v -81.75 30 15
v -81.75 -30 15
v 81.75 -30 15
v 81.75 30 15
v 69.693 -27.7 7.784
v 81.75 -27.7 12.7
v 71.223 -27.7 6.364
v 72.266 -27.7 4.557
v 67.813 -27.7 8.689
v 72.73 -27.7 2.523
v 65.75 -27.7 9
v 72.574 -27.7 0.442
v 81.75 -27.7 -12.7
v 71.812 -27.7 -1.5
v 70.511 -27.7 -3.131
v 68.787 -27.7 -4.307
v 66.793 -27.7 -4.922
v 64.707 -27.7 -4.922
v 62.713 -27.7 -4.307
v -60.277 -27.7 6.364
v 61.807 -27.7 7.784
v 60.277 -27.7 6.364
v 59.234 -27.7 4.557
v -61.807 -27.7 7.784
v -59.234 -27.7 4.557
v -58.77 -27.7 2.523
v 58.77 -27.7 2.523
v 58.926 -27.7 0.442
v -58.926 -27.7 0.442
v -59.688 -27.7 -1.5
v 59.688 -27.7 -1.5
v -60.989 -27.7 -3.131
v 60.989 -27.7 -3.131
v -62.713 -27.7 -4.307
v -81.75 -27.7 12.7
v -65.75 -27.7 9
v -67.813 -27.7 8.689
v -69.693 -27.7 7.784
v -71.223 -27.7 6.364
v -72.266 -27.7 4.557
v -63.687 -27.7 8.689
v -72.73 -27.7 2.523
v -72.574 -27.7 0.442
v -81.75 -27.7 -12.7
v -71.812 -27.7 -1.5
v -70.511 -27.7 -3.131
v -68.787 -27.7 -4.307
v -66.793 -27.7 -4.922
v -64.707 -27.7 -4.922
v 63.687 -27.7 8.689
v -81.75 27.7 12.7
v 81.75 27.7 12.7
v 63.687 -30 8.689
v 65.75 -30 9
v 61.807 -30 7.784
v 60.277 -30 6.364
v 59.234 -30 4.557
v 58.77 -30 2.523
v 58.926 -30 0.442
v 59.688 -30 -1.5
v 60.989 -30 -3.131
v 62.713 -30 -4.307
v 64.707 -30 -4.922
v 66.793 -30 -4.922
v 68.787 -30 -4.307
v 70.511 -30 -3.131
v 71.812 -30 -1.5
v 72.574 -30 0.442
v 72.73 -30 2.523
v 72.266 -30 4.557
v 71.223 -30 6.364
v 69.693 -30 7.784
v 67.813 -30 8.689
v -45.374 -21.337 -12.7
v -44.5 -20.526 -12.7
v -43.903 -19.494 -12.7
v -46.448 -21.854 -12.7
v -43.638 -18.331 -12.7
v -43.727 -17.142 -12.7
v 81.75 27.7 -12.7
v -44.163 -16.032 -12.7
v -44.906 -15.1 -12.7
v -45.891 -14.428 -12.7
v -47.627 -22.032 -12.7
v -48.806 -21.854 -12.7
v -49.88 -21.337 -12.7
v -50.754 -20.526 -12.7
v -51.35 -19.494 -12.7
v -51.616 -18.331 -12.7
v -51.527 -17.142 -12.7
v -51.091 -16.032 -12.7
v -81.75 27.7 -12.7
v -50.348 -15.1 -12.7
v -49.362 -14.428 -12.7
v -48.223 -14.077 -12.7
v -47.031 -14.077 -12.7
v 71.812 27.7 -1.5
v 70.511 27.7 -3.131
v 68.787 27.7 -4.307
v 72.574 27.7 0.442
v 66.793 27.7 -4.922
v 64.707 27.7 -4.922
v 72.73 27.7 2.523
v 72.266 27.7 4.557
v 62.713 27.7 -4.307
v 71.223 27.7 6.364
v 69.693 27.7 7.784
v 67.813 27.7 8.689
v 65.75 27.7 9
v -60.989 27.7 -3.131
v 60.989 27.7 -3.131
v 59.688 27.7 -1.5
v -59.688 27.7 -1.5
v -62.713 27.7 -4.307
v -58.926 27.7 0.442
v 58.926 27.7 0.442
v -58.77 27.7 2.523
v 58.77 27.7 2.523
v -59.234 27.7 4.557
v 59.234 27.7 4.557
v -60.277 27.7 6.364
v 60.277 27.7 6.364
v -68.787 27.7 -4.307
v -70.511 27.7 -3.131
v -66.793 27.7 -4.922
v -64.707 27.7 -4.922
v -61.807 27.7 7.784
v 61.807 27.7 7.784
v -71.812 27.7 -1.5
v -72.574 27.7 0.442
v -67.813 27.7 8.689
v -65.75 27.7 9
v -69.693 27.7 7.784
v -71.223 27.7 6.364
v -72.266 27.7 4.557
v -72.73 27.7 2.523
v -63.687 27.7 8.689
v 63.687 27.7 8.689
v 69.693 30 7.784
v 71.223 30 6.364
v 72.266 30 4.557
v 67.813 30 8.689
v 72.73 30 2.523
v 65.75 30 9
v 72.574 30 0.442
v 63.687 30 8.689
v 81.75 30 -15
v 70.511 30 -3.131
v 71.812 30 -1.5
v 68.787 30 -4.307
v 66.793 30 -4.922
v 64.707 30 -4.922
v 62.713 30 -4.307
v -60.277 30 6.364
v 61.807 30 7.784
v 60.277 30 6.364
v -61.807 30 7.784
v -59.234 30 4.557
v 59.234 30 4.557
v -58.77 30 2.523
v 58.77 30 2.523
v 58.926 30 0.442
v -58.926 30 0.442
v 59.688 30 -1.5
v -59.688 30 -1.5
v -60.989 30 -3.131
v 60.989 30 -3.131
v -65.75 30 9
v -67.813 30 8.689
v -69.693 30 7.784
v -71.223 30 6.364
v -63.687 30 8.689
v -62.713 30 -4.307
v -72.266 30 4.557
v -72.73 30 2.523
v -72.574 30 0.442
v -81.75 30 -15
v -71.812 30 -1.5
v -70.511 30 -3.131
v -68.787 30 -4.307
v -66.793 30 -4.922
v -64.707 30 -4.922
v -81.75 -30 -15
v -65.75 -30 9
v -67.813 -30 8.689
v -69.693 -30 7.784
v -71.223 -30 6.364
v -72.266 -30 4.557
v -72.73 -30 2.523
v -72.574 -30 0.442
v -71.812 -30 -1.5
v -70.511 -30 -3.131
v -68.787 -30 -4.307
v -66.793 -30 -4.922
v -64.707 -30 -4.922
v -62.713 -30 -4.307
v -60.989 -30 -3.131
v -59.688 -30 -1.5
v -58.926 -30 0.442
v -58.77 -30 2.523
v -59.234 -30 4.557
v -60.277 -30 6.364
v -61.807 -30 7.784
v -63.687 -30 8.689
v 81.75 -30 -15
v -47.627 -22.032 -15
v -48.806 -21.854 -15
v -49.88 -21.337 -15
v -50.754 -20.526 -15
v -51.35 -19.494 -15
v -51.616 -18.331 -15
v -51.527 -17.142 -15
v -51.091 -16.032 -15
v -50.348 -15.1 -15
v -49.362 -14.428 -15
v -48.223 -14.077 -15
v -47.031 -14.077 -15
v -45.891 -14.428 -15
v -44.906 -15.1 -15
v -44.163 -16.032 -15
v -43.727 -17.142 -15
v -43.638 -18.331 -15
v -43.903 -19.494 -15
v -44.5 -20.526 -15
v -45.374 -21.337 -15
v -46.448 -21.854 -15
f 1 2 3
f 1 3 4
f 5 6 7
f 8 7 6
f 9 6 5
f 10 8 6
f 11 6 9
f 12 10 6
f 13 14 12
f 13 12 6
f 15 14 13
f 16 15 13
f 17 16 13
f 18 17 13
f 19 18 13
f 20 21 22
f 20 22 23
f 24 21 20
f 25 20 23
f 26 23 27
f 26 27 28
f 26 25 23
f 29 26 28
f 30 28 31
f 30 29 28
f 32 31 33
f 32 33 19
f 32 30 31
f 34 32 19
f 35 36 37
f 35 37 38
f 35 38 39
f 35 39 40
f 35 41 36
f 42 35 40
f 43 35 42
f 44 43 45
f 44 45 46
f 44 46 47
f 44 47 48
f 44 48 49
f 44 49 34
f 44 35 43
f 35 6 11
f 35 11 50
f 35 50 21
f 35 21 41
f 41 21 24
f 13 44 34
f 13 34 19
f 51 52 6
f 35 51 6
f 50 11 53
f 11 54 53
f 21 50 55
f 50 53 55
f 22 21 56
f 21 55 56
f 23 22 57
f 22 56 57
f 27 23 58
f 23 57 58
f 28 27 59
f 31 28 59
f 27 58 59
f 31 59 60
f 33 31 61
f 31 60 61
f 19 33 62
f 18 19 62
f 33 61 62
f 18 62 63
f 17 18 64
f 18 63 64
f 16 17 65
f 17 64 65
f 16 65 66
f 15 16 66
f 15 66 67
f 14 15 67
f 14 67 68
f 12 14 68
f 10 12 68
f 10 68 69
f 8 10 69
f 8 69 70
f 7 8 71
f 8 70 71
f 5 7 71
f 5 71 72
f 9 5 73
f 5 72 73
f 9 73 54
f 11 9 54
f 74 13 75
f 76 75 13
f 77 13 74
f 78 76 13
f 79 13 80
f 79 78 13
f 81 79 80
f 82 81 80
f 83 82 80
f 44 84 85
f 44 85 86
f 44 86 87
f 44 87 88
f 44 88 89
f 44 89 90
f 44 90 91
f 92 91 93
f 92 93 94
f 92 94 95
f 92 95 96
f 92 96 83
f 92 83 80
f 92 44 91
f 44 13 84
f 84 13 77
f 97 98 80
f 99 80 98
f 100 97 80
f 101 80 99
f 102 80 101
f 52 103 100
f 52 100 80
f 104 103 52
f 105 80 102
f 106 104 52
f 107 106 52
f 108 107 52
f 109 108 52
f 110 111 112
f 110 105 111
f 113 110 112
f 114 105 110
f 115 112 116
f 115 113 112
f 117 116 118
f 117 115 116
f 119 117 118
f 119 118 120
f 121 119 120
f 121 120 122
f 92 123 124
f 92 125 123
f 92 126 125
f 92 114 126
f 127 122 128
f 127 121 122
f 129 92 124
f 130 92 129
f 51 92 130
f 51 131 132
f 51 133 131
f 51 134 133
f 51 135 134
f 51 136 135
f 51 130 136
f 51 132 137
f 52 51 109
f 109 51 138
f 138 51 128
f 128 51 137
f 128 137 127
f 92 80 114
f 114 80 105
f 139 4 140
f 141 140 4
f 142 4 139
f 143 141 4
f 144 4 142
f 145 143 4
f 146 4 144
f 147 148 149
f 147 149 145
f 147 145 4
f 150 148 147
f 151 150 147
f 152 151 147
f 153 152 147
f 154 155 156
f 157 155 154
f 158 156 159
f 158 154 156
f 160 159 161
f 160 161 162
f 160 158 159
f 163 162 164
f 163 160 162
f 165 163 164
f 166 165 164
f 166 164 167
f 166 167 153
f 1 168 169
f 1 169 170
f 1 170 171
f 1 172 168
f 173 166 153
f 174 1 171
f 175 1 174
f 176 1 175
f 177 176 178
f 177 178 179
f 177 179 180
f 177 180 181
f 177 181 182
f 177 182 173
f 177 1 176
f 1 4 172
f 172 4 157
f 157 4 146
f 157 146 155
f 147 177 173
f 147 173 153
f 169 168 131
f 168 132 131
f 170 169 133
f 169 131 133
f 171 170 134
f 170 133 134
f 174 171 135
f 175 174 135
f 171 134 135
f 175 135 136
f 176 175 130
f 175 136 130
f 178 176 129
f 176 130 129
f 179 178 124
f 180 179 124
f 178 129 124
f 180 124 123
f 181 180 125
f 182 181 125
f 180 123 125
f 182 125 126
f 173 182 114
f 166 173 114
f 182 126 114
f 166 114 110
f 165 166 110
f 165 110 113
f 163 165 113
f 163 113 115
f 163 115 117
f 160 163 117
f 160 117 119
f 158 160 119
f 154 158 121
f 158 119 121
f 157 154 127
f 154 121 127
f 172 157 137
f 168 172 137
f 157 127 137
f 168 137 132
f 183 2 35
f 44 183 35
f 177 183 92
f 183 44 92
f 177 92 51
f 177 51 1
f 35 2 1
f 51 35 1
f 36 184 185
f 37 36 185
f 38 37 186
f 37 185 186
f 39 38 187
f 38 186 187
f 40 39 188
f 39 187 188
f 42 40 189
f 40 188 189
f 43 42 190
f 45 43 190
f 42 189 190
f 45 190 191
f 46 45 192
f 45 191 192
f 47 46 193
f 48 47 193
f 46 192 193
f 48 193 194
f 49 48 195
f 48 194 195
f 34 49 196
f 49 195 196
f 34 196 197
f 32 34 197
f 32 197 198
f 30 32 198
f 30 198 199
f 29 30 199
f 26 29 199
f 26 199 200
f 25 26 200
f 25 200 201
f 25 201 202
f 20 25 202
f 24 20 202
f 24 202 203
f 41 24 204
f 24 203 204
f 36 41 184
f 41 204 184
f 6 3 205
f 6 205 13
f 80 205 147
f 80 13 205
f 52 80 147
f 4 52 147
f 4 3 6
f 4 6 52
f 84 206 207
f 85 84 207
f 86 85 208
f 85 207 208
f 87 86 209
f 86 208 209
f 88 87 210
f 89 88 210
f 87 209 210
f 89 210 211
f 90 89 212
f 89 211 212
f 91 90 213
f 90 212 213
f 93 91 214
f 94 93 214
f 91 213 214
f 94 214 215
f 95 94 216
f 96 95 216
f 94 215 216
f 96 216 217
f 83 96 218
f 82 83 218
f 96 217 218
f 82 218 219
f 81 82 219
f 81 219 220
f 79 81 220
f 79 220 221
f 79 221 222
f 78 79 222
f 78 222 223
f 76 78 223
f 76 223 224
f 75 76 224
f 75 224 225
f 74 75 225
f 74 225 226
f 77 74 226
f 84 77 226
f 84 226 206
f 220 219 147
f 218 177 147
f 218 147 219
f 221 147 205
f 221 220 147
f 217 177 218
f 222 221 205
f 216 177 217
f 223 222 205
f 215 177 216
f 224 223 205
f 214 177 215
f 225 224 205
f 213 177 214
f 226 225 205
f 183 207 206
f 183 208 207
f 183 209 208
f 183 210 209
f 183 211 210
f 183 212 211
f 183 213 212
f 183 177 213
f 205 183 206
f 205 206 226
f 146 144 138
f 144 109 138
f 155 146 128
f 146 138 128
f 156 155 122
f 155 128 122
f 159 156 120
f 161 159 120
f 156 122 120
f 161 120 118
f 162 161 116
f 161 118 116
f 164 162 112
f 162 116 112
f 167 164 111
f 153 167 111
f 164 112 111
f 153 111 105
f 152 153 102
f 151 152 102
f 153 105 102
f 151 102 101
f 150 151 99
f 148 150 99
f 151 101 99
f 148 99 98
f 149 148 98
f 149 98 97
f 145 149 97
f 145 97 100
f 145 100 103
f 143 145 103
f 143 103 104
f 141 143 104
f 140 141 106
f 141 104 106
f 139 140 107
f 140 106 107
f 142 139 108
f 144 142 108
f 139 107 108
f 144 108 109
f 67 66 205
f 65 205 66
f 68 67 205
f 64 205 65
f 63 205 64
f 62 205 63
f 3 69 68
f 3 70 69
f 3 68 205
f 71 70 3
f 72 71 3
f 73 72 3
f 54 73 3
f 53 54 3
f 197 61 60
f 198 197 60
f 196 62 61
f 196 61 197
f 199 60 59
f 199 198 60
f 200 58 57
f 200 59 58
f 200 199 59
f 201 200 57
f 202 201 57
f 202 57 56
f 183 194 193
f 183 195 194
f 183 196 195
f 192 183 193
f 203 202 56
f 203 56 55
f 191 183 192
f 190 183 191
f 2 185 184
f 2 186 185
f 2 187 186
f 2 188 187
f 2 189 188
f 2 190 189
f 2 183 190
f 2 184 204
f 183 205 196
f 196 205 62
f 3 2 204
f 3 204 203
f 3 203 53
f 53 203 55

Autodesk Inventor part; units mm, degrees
ref_plane "YZ Plane" through (0, 0, 0) normal (1, 0, 0) x (0, 1, 0)
ref_plane "XZ Plane" through (0, 0, 0) normal (0, 1, 0) x (-1, 0, 0)
ref_plane "XY Plane" through (0, 0, 0) normal (0, 0, 1) x (1, 0, 0)
sketch "スケッチ1" plane through (0, 0, 0) normal (1, 0, 0) x (0, 1, 0)
  line L0 (-30, 15) -> (30, 15)
  line L1 (30, 15) -> (30, -15)
  line L2 (30, -15) -> (-30, -15)
  line L3 (-30, -15) -> (-30, 15)
  line L4 (-30, 15) -> (30, -15) construction
  line L5 (30, 15) -> (-30, -15) construction
  line L6 (27.7, 12.7) -> (-27.7, 12.7)
  line L7 (-27.7, 12.7) -> (-27.7, -12.7)
  line L8 (-27.7, -12.7) -> (27.7, -12.7)
  line L9 (27.7, -12.7) -> (27.7, 12.7)
  point P0 (0, 0)
  dimension "d0" = 60
  dimension "d1" = 30
  dimension "d2" = 2.3
extrude "押し出し1" add sketch "スケッチ1" along normal mid plane 163.5
sketch "スケッチ2" plane through (-81.75, 30, 15) normal (0, 1, 0) x (1, 0, 0)
  line L0 (163.5, 30) -> (0, 30) projected
  line L1 (163.5, 30) -> (163.5, 0) projected
  line L2 (0, 0) -> (0, 30) projected
  point P0 (16, 13)
  point P1 (147.5, 13)
  dimension "d14" = 17
  dimension "d15" = 17
  dimension "d16" = 16
  dimension "d17" = 16
hole "穴1" at (-65.75, 30, 2) at (65.75, 30, 2) direction (0, -1, 0) diameter 14 end through all
sketch "スケッチ5" plane through (-81.75, 27.7, -12.7) normal (0, 0, 1) x (1, 0, 0)
  circle A0 centre (34.1231, -45.7322) radius 5 construction
  point P0 (81.75, -27.7)
hole "穴2" at (-47.6269, -18.0322, -12.7) direction (0, 0, -1) diameter 8 end through all
properties part number "車軸受け3"
